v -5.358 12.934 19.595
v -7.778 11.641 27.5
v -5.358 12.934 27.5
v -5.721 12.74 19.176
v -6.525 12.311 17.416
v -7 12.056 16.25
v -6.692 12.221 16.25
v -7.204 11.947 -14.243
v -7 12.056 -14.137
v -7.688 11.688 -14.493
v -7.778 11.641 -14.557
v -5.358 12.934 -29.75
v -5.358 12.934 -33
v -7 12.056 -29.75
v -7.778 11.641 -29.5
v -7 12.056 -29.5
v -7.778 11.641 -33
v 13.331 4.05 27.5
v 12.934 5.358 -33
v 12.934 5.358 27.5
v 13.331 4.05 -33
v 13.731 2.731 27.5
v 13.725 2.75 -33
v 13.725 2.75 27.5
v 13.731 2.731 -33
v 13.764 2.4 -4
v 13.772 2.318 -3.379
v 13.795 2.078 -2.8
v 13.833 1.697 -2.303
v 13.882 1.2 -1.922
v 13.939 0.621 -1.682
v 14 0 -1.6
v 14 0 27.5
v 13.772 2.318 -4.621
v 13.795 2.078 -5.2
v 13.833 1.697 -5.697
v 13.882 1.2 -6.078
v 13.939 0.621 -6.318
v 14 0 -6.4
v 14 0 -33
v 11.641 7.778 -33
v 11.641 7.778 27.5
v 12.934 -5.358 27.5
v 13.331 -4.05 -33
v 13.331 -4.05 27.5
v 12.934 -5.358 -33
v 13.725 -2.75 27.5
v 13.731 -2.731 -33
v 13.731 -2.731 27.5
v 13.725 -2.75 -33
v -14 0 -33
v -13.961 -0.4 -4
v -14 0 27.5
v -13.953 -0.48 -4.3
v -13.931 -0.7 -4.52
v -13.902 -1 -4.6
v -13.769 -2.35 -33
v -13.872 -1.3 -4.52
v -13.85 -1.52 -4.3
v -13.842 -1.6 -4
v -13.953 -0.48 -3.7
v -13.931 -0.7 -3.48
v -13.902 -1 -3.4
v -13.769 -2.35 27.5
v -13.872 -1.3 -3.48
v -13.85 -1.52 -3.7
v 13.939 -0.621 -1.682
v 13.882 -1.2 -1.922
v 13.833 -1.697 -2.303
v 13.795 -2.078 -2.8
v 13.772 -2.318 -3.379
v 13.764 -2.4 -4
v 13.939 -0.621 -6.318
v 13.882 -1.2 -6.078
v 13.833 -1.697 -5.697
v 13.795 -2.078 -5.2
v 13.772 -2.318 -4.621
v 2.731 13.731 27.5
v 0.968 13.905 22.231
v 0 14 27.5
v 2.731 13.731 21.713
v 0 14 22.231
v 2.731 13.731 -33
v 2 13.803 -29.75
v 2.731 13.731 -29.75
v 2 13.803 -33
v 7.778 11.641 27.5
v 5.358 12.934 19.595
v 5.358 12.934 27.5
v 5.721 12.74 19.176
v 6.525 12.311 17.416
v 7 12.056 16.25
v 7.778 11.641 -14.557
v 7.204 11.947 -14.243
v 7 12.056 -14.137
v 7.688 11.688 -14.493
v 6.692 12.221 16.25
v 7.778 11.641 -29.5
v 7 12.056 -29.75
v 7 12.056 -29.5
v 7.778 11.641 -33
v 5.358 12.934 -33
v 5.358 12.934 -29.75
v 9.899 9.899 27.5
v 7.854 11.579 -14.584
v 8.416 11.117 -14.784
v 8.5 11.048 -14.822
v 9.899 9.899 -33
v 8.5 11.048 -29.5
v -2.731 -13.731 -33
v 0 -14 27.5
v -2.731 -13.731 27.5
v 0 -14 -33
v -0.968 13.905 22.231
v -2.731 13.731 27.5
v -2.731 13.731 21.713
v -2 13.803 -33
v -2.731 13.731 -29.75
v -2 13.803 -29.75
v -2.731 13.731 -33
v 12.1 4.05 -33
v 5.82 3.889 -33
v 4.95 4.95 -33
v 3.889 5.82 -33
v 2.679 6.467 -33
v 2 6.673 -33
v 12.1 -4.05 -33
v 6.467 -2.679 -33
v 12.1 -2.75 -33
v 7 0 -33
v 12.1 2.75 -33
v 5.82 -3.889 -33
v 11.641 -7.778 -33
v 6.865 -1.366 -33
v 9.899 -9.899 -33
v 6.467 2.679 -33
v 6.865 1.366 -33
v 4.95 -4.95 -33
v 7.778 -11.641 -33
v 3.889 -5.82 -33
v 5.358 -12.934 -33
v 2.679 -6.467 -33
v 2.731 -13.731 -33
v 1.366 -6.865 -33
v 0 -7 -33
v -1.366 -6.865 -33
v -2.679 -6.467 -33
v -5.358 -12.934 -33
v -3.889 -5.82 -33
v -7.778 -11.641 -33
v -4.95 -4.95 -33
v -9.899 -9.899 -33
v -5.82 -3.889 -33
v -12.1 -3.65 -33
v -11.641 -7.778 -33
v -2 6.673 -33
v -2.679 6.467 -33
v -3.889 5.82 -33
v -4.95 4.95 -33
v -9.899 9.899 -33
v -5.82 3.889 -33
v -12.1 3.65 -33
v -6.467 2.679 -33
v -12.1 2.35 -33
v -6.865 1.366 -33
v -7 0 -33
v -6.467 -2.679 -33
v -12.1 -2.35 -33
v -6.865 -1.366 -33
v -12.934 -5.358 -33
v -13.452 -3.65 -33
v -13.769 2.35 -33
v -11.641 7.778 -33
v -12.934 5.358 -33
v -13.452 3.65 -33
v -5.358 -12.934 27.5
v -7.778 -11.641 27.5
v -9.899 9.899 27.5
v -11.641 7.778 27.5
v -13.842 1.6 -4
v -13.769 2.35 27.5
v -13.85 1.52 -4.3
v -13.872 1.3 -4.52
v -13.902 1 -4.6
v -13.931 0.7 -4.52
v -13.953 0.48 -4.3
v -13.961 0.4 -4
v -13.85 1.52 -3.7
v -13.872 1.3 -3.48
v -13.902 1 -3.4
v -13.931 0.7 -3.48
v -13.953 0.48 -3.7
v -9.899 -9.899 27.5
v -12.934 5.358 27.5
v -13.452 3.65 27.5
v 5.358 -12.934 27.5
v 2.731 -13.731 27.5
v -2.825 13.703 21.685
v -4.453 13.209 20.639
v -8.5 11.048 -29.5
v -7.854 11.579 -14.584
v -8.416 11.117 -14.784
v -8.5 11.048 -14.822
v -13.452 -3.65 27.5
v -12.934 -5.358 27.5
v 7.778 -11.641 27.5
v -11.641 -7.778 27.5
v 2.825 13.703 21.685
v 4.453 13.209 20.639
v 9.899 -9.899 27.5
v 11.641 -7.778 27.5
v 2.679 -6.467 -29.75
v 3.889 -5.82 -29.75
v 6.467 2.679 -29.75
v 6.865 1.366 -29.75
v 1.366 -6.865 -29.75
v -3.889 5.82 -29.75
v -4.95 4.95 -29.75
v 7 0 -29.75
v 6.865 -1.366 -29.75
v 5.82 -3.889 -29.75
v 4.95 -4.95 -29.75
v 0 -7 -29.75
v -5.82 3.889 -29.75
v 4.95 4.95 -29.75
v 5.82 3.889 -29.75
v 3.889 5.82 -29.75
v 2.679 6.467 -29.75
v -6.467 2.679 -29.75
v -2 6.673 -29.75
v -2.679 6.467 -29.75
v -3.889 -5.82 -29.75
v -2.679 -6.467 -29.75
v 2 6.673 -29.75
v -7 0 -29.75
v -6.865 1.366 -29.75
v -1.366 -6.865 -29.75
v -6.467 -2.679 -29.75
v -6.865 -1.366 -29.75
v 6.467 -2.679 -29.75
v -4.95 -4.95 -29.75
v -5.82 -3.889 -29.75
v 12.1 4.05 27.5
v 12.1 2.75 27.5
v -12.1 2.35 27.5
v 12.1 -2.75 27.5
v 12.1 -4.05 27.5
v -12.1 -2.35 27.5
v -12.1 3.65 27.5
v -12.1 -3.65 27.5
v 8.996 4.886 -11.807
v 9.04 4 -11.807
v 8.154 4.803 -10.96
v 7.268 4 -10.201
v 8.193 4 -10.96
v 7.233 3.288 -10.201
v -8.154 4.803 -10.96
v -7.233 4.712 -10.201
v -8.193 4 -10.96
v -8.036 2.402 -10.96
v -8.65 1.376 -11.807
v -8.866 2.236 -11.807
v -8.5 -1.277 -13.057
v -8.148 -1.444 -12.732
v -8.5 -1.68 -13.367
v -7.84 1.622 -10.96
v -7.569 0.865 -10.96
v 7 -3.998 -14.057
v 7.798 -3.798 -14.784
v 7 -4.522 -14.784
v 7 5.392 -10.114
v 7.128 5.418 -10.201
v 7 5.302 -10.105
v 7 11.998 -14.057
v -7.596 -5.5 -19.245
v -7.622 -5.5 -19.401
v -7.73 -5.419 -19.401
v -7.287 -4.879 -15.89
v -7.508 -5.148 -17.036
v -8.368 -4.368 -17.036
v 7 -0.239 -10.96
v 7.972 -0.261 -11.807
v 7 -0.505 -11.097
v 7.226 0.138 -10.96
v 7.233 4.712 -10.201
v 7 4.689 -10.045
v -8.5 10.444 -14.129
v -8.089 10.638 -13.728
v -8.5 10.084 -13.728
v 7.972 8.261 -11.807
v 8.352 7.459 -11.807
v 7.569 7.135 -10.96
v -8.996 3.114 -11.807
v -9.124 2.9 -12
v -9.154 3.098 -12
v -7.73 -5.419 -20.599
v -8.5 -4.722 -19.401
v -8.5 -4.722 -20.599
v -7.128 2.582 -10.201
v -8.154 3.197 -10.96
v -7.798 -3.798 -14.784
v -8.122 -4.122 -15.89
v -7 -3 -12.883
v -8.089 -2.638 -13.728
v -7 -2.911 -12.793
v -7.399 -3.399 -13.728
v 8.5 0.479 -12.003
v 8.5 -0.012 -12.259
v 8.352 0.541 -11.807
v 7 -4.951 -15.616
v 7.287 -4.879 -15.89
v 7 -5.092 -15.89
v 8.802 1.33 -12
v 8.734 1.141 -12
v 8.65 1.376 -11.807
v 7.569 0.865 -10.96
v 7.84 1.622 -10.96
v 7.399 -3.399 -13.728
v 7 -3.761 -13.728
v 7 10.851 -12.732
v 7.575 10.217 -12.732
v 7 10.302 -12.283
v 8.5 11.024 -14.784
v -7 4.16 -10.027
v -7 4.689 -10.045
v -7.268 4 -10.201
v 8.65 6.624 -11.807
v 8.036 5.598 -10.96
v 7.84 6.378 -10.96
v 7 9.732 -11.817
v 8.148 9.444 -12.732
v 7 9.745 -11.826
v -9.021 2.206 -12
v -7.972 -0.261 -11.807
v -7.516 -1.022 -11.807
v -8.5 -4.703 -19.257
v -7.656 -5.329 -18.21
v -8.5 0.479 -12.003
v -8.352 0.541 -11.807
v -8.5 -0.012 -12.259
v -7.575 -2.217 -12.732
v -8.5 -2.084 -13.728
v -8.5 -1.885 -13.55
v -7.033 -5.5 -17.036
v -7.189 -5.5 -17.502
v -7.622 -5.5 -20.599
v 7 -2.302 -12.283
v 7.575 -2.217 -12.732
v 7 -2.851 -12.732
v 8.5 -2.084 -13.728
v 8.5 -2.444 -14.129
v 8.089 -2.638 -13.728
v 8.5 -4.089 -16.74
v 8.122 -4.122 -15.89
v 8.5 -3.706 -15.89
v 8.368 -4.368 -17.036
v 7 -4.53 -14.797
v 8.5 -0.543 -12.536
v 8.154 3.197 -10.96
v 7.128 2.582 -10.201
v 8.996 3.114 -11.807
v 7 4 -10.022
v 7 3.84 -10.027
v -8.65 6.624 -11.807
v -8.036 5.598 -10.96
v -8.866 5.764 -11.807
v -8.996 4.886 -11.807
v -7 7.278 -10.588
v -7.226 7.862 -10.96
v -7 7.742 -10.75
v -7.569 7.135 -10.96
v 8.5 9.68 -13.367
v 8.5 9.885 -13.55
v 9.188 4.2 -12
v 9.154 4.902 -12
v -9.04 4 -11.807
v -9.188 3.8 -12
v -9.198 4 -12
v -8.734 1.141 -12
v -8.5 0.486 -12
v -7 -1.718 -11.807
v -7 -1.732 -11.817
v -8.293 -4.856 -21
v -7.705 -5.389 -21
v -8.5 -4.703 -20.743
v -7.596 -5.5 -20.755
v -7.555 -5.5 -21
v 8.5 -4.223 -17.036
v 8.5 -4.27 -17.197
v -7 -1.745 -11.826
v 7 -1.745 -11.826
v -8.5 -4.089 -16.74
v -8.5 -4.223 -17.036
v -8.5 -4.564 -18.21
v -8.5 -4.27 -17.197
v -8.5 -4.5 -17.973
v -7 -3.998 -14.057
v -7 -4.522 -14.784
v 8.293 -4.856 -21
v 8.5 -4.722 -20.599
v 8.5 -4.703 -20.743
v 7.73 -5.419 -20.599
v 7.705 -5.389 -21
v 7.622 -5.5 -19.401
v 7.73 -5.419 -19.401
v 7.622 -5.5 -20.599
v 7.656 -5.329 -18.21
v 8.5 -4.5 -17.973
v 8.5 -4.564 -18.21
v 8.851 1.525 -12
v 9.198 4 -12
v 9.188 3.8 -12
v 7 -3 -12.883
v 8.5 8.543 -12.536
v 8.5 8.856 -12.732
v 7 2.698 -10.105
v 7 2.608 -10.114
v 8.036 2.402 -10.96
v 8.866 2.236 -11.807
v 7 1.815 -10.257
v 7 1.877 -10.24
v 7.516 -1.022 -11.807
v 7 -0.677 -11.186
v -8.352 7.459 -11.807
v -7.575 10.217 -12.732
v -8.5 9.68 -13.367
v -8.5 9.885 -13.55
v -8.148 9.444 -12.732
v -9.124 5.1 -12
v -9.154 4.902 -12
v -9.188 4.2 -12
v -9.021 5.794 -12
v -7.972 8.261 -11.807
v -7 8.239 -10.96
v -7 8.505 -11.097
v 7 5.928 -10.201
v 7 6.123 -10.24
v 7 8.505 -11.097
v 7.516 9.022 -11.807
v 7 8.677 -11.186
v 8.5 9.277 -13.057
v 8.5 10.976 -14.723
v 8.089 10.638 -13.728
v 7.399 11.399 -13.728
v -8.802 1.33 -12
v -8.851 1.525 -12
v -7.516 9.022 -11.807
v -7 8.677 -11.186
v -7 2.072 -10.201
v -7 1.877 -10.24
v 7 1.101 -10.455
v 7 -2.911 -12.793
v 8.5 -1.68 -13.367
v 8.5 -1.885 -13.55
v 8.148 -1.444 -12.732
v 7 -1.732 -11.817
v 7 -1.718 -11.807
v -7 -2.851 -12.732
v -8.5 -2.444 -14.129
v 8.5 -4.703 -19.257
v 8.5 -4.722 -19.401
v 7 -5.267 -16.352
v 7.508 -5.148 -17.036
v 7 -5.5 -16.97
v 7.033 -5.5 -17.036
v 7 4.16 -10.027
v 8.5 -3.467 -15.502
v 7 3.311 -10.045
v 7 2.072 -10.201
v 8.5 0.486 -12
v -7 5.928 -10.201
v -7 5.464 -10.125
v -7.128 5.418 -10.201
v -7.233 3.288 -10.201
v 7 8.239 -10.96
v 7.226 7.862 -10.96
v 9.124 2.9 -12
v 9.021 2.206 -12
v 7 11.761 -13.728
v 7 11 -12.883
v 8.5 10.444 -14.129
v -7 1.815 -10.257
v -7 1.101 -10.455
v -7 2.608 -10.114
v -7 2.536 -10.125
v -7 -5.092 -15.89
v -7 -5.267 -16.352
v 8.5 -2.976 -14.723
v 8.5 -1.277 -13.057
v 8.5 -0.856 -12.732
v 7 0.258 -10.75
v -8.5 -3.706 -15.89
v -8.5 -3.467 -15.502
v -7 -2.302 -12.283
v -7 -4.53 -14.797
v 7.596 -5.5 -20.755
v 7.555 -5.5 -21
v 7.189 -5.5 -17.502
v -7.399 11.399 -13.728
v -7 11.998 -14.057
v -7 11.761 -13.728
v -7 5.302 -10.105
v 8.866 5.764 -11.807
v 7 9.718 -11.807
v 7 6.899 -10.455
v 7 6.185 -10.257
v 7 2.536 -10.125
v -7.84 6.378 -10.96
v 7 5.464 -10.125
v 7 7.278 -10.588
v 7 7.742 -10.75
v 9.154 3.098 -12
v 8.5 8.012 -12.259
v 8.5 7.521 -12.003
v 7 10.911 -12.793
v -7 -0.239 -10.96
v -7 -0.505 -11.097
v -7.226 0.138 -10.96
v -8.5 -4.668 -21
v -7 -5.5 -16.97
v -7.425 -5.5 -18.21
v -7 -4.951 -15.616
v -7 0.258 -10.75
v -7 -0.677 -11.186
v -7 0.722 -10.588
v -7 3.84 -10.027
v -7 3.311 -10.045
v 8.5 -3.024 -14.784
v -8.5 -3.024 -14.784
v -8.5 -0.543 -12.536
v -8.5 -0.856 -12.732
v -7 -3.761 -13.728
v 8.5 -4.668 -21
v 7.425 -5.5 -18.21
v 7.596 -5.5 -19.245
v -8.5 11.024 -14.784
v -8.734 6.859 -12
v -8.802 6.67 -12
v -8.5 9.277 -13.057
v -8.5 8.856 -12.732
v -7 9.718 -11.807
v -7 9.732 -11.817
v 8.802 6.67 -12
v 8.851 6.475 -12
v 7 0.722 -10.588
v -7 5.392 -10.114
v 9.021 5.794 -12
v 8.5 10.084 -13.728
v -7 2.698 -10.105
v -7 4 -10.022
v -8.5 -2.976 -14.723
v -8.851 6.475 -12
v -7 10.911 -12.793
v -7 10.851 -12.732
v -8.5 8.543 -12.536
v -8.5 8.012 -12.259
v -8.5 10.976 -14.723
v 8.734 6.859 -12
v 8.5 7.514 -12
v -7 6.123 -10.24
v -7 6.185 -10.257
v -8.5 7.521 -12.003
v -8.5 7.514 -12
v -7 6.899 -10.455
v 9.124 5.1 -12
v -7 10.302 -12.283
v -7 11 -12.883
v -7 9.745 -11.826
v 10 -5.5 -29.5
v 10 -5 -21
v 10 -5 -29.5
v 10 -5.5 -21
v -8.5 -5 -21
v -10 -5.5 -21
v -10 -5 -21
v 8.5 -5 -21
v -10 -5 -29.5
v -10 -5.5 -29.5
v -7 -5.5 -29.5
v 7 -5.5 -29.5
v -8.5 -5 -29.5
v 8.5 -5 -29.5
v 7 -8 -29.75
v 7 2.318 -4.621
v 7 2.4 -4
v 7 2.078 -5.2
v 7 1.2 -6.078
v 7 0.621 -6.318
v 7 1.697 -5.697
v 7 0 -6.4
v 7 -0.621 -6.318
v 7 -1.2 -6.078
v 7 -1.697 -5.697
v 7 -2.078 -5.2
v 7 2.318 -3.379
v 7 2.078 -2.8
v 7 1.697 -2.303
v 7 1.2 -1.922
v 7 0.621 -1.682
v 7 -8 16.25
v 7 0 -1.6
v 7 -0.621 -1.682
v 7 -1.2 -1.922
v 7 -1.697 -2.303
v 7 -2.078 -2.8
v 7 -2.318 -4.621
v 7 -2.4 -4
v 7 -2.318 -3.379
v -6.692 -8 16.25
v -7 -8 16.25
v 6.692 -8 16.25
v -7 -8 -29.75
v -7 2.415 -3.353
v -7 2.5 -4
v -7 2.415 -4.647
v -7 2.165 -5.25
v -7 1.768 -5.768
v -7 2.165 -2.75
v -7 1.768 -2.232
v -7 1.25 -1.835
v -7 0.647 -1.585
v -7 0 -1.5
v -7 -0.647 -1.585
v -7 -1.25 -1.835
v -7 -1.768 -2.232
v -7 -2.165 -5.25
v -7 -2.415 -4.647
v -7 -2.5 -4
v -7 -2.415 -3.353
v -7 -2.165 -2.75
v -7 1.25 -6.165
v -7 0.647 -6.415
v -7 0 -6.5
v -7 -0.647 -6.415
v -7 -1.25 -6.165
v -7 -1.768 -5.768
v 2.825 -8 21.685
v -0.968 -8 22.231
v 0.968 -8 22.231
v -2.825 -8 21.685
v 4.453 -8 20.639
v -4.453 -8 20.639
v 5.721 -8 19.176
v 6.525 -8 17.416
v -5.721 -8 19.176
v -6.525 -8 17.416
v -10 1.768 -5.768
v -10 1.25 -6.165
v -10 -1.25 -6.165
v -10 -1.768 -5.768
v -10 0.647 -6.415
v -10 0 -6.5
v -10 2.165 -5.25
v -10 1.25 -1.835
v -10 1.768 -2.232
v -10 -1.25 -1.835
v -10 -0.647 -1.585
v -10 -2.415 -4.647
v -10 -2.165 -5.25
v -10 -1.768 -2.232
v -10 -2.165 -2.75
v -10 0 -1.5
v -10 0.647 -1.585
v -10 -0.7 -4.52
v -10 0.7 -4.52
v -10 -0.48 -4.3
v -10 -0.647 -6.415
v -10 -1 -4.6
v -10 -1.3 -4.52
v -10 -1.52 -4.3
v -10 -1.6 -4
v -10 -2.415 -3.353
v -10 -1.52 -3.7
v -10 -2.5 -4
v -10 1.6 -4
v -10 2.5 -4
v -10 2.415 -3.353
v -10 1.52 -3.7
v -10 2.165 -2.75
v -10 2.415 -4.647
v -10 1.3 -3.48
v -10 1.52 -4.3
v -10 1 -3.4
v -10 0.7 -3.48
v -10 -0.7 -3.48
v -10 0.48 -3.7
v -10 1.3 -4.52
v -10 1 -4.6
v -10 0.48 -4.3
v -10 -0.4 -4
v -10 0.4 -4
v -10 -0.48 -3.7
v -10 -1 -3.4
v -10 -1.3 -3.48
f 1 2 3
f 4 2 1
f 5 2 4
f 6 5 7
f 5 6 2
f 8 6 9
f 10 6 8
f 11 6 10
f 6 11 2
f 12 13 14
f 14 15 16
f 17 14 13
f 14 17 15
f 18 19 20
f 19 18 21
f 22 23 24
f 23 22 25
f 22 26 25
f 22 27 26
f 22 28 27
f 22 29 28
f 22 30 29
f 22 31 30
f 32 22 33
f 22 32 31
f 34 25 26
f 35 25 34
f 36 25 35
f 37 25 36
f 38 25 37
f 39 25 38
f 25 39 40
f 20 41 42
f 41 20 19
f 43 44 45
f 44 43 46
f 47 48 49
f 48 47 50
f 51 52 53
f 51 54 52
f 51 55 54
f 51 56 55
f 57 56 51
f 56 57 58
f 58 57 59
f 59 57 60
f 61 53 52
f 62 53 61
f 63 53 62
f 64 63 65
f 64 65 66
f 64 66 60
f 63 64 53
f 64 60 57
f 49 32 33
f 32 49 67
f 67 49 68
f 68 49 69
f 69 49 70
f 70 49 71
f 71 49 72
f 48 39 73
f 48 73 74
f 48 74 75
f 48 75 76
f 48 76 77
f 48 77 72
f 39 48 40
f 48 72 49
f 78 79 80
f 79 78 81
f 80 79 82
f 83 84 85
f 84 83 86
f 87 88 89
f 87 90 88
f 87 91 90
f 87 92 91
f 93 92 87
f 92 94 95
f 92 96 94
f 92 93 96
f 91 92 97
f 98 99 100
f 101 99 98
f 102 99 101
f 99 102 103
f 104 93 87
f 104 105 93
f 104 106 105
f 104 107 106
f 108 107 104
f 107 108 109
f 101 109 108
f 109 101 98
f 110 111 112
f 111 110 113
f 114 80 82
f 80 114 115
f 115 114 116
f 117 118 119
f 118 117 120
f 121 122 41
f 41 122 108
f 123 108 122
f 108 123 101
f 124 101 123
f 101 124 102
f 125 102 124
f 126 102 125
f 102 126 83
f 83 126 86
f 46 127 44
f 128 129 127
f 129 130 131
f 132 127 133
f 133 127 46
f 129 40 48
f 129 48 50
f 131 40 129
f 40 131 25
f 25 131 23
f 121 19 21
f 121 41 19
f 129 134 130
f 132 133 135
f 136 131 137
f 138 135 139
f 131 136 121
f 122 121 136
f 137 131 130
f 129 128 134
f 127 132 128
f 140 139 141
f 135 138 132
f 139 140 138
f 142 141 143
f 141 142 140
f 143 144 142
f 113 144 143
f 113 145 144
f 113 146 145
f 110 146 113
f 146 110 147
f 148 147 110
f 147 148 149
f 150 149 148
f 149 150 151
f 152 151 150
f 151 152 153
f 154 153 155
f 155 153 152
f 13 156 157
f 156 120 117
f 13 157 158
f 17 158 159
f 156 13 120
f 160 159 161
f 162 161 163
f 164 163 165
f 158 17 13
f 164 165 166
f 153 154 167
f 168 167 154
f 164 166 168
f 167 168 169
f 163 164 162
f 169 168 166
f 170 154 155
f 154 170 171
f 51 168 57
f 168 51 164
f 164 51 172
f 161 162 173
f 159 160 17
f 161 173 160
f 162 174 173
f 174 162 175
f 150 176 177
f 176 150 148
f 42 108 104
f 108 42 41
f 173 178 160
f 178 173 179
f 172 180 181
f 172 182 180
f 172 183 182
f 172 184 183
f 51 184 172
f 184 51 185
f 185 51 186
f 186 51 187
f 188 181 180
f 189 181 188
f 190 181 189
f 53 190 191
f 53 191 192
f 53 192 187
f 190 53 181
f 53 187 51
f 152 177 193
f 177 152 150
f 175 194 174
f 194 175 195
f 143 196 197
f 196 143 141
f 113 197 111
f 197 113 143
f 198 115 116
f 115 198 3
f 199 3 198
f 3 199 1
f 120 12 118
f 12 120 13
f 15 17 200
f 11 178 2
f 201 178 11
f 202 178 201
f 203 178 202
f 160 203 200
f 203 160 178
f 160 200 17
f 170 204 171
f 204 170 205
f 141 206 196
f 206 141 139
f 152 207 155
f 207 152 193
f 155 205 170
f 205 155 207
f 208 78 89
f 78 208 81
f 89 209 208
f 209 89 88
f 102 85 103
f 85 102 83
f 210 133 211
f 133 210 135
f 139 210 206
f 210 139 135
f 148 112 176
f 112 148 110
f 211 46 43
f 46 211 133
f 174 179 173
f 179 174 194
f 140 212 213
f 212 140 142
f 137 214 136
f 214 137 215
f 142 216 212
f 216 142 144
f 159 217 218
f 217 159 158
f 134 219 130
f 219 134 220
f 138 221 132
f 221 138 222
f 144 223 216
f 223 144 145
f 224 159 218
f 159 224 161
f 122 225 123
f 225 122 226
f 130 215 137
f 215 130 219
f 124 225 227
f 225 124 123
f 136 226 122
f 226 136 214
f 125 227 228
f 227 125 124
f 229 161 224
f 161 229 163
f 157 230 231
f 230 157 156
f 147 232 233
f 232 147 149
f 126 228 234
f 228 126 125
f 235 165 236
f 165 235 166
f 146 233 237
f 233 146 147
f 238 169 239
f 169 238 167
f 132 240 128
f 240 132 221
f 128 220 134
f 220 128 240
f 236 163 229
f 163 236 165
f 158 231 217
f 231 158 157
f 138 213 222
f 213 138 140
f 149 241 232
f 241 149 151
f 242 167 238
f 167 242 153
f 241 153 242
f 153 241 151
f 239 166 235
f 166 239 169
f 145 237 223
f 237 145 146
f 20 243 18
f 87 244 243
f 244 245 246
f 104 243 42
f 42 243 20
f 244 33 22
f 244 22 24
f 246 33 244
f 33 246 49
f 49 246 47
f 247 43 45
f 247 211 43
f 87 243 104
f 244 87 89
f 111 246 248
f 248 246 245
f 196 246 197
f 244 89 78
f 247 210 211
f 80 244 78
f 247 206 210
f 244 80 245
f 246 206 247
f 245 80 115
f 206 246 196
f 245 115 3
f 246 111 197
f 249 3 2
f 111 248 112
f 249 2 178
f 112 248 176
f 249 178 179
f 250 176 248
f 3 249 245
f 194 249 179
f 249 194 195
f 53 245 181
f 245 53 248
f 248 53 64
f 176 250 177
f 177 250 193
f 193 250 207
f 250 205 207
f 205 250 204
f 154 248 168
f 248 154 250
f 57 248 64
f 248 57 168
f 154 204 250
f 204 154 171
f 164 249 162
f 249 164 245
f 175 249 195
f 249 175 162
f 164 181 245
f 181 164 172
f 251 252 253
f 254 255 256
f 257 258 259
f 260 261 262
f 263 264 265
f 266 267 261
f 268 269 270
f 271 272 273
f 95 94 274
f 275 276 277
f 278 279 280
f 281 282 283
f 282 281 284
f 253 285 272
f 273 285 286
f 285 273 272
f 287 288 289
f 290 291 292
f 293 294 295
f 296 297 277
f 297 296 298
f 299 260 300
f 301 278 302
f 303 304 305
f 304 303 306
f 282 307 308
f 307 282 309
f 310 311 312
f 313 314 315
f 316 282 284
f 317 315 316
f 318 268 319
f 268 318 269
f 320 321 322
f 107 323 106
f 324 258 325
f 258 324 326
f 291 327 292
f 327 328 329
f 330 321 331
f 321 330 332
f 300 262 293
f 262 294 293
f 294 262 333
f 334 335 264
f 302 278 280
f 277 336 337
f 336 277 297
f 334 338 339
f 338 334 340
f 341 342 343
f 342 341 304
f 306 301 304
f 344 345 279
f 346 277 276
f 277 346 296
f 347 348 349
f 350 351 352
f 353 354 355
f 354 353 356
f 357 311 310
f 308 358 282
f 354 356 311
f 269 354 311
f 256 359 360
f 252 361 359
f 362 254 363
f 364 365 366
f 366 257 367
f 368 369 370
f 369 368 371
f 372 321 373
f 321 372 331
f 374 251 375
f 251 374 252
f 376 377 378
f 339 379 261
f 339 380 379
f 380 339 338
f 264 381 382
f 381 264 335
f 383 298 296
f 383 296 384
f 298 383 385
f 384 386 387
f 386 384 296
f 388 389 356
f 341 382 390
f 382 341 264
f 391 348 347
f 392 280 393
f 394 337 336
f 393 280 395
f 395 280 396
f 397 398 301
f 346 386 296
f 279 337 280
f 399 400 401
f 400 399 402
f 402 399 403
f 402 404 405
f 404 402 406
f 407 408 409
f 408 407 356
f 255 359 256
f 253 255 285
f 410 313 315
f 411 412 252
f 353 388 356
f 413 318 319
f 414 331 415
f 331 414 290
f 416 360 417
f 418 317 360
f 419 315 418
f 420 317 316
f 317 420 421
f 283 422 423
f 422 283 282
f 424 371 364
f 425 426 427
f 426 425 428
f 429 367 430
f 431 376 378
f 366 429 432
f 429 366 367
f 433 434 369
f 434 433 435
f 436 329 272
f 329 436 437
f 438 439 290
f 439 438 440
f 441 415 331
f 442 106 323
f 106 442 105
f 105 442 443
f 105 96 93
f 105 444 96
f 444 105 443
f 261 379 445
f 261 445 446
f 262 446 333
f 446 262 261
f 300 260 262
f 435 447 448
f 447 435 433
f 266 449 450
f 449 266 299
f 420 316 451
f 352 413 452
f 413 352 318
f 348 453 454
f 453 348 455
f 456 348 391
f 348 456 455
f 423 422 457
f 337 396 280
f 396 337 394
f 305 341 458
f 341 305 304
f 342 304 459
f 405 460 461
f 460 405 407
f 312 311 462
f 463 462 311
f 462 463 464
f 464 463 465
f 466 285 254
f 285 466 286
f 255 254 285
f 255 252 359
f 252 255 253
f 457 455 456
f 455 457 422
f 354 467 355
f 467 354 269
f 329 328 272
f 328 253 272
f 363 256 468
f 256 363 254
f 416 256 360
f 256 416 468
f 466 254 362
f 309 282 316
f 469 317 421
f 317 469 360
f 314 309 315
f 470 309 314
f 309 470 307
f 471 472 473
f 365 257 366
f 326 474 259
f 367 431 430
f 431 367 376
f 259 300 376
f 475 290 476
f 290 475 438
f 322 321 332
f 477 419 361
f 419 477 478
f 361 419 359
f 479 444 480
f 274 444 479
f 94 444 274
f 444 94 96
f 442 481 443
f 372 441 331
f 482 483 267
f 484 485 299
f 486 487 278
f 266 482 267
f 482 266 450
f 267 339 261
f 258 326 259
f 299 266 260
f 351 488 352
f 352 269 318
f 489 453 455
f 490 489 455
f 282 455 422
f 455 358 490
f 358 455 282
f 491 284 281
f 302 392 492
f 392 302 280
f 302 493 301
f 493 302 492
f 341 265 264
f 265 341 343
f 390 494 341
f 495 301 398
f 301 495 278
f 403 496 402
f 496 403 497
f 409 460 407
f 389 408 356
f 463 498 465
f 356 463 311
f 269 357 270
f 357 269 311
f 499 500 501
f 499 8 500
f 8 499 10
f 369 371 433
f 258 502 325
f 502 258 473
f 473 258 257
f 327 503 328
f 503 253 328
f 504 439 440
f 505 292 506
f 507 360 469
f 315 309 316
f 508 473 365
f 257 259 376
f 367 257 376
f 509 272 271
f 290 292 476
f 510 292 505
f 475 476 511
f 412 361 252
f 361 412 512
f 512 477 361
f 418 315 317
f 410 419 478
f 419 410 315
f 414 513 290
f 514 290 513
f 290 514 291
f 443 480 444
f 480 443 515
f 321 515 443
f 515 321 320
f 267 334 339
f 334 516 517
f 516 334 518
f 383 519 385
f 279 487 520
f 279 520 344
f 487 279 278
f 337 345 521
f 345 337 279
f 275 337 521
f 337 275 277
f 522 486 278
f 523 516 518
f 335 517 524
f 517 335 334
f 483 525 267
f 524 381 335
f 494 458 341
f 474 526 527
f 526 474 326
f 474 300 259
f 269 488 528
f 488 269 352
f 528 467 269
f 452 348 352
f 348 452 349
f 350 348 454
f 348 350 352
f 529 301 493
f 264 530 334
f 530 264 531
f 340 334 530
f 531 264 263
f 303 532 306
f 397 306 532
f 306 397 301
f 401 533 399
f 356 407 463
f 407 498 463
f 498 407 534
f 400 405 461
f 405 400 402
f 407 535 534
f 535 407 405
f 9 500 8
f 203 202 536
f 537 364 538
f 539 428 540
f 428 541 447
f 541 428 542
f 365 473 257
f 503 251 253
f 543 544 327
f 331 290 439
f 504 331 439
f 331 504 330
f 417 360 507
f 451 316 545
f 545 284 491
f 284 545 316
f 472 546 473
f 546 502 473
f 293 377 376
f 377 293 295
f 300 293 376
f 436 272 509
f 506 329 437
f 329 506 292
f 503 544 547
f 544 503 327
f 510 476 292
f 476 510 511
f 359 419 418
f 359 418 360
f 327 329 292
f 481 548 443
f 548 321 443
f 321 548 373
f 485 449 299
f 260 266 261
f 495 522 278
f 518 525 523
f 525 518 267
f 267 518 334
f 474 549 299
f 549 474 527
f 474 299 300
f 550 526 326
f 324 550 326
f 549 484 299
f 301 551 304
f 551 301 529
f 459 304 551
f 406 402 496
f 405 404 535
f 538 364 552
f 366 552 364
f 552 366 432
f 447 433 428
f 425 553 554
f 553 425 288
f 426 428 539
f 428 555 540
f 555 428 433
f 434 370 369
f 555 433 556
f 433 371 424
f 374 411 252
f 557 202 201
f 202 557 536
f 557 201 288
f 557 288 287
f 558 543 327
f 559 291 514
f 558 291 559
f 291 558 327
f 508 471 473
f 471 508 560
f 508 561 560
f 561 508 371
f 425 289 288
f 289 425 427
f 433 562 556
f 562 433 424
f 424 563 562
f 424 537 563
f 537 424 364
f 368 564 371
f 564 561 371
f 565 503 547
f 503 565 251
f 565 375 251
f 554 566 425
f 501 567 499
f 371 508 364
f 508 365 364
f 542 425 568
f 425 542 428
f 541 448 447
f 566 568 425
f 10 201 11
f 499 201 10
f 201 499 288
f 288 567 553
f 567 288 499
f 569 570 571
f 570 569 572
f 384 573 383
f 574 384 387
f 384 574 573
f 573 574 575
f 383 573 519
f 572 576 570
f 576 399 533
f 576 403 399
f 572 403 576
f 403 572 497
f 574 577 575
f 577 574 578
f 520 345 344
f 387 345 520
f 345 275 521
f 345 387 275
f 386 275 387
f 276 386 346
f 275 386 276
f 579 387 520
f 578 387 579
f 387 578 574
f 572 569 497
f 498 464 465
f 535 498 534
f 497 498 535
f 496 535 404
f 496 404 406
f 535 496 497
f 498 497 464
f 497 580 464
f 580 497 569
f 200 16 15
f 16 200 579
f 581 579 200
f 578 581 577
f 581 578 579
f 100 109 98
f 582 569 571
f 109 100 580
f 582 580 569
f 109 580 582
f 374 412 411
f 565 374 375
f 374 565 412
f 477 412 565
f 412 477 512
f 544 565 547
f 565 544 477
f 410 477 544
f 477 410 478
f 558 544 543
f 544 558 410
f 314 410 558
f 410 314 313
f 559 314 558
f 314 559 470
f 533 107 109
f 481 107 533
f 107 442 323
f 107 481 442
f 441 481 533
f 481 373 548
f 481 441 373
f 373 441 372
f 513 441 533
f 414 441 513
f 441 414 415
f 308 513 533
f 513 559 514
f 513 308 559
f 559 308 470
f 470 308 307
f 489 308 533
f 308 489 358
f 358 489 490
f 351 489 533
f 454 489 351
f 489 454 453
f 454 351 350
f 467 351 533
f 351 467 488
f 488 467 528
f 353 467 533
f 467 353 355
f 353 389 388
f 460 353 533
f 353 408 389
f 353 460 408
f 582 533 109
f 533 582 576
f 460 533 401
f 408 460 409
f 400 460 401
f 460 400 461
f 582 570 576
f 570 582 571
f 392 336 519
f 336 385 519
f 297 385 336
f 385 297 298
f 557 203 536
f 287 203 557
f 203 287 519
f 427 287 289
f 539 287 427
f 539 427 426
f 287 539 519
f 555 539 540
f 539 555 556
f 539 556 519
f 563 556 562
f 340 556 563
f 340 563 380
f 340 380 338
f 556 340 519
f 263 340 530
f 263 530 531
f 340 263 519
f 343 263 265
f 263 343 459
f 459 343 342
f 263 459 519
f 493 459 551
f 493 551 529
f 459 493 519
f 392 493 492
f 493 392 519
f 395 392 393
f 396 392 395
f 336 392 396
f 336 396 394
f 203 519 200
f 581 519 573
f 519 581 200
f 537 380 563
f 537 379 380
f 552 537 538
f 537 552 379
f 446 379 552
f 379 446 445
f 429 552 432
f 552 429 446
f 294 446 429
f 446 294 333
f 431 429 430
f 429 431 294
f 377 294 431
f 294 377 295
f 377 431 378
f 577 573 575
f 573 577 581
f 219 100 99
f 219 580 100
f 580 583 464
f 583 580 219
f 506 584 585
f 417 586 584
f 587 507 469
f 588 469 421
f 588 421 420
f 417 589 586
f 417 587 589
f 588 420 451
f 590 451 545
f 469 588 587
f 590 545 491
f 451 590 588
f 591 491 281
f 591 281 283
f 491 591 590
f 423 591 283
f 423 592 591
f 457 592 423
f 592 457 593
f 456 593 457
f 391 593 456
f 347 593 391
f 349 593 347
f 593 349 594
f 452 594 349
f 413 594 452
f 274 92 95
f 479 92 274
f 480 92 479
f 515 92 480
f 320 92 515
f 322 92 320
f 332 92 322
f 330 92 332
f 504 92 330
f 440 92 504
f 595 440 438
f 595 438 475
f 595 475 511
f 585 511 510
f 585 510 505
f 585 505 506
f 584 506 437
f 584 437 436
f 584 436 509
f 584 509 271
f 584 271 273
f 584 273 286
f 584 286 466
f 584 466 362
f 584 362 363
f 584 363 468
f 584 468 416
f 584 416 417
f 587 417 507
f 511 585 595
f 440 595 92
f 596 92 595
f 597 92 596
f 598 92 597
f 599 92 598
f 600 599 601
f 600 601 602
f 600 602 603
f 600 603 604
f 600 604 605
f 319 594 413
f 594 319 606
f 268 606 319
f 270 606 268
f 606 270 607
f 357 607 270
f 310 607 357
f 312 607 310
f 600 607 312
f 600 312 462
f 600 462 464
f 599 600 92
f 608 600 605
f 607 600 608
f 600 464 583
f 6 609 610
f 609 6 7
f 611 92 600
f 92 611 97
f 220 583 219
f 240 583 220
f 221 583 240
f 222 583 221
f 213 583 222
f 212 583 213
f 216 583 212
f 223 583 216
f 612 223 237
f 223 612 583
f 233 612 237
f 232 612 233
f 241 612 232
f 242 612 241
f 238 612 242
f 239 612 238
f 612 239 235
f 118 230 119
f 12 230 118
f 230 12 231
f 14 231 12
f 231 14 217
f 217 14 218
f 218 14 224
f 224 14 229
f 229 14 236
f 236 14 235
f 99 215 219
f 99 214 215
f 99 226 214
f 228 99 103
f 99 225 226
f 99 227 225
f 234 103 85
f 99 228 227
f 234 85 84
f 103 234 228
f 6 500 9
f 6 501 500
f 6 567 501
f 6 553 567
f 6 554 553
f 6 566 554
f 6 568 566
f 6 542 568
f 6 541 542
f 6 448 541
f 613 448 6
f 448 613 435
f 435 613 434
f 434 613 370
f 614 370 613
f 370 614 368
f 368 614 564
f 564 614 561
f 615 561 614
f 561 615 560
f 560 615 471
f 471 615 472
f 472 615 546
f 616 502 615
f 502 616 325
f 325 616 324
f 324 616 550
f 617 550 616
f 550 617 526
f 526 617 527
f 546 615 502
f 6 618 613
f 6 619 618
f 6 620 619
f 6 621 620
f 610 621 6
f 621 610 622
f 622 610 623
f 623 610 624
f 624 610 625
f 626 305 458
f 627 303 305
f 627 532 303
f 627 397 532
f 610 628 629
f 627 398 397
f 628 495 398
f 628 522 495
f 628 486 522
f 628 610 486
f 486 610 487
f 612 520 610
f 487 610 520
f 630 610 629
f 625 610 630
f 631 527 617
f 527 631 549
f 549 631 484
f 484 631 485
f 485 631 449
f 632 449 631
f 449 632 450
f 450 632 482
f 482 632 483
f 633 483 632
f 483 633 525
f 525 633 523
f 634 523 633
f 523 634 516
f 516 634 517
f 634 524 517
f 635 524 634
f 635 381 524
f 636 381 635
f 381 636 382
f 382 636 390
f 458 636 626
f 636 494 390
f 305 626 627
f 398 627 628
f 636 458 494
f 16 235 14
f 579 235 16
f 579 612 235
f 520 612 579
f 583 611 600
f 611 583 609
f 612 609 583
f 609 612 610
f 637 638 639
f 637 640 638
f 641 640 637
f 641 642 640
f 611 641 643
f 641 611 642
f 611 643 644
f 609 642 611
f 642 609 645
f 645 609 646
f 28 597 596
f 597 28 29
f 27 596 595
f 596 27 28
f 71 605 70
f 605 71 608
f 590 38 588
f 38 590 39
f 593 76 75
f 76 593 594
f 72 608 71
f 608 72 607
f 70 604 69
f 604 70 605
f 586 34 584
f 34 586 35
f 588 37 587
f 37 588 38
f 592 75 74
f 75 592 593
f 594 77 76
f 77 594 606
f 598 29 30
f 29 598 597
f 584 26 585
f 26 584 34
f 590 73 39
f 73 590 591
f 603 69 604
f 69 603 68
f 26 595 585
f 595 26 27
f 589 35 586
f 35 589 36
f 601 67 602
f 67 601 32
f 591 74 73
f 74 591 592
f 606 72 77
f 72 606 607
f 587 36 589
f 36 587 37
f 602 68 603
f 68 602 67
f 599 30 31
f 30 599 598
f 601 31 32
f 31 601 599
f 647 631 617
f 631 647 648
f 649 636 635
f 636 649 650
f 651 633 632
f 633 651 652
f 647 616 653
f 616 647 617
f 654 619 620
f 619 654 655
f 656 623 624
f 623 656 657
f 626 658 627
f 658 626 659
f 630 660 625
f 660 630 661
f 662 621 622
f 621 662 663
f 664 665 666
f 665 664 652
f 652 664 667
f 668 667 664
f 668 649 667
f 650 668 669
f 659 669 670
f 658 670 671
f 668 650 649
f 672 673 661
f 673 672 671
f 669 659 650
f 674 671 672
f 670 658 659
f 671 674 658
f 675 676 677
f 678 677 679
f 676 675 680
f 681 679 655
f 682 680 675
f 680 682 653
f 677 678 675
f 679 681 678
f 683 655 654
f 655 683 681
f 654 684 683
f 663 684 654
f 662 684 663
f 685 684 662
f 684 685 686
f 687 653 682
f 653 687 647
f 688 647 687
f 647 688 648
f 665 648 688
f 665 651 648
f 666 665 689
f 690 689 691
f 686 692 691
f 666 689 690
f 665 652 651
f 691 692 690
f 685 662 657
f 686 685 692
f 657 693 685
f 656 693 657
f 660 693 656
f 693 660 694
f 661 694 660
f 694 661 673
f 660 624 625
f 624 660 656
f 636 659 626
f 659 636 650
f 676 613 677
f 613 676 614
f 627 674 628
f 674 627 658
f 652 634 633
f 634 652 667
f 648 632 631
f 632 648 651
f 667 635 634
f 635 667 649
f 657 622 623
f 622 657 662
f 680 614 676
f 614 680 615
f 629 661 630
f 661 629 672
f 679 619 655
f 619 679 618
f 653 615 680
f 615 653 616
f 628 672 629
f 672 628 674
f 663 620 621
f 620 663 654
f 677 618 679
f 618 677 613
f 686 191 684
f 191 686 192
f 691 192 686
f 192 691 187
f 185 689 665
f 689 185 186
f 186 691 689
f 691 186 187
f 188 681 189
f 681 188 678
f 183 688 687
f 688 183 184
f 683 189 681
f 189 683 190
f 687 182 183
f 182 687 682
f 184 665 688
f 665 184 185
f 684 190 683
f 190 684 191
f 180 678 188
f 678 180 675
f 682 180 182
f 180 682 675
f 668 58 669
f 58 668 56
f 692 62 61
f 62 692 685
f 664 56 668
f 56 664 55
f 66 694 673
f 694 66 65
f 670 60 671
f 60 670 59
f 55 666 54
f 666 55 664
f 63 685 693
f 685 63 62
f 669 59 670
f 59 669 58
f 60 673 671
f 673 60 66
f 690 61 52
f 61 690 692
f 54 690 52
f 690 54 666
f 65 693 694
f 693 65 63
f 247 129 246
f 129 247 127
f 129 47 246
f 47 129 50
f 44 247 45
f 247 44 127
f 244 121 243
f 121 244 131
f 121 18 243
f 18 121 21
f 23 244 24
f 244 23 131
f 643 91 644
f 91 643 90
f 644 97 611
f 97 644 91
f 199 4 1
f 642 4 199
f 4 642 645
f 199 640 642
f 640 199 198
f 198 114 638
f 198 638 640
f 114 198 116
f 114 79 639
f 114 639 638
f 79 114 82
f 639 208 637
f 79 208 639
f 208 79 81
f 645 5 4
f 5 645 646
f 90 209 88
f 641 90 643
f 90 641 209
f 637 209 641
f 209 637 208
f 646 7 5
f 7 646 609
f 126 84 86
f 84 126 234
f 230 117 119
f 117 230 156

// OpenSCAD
height = 55;
dia = 28;
ch = 46;

module plug(d) 
{
rad = d/2;
q = d/3;
gz = -height/2;
gh = height;

	difference() 
	{
    union() {
	  cylinder(r=rad, h=height, center=true, $fn=32);

     translate([0,0,-30])
     difference() {
	    cylinder(r=rad, h=6, center=true, $fn=32);
	    cylinder(r=rad/2, h=6, center=true, $fn=32);
      }
     }
	  translate([0,rad/2-4,rad/2-height/4])
		 cube([14,22,ch],center=true);
// LED Hole
     translate([10,0,-4])
     rotate([0,90,0])
          cylinder(r=2.4,h=20,center=true,$fn=24);
// Phototransitor Holes
     translate([-8,0,-4])
     rotate([0,90,0])
          cylinder(r=2.5,h=4,center=true,$fn=24);
     translate([-8,1,-4])
     rotate([0,90,0])
          cylinder(r=0.6,h=16,center=true,$fn=12);
     translate([-8,-1,-4])
     rotate([0,90,0])
          cylinder(r=0.6,h=16,center=true,$fn=12);

// Wire Grooves
     translate([rad-1,-3.4,gz])
          cube([1.8,1.3,2*gh],center=true);
     translate([rad-1,3.4,gz])
          cube([1.8,1.3,2*gh],center=true);

     translate([2-d,0,0]) {
        translate([rad-1,-3,gz])
           cube([1.8,1.3,2*gh],center=true);
        translate([rad-1,3,gz])
           cube([1.8,1.3,2*gh],center=true);
	  }
    translate([0,3,height/2-12])
      rotate([90,0,0])
        cylinder(r=6.8,h=22,center=true);
  translate([0,12,-(3+height/2)])
      cube([4,12,6],center=true);
 translate([0,7,-27]) cav();
  } // End of difference()

}

module cav() {
    difference() {
     union() {
       translate([0,-3,7]) sphere(12.2,center=true,$fn=64);
       translate([0,-6,1]) cube([20,23,10],center=true);
     }
     translate([0,-20,0]) cube([30,15,30],center=true);
     translate([0,0,-10]) cube([30,30,15],center=true);
     translate([11,0,0]) cube([5,24,30],center=true);
     translate([-11,0,0]) cube([5,24,30],center=true);
  }
}


plug(dia);
//translate([0,0,-7]) cube([4,4,45],center=true);
